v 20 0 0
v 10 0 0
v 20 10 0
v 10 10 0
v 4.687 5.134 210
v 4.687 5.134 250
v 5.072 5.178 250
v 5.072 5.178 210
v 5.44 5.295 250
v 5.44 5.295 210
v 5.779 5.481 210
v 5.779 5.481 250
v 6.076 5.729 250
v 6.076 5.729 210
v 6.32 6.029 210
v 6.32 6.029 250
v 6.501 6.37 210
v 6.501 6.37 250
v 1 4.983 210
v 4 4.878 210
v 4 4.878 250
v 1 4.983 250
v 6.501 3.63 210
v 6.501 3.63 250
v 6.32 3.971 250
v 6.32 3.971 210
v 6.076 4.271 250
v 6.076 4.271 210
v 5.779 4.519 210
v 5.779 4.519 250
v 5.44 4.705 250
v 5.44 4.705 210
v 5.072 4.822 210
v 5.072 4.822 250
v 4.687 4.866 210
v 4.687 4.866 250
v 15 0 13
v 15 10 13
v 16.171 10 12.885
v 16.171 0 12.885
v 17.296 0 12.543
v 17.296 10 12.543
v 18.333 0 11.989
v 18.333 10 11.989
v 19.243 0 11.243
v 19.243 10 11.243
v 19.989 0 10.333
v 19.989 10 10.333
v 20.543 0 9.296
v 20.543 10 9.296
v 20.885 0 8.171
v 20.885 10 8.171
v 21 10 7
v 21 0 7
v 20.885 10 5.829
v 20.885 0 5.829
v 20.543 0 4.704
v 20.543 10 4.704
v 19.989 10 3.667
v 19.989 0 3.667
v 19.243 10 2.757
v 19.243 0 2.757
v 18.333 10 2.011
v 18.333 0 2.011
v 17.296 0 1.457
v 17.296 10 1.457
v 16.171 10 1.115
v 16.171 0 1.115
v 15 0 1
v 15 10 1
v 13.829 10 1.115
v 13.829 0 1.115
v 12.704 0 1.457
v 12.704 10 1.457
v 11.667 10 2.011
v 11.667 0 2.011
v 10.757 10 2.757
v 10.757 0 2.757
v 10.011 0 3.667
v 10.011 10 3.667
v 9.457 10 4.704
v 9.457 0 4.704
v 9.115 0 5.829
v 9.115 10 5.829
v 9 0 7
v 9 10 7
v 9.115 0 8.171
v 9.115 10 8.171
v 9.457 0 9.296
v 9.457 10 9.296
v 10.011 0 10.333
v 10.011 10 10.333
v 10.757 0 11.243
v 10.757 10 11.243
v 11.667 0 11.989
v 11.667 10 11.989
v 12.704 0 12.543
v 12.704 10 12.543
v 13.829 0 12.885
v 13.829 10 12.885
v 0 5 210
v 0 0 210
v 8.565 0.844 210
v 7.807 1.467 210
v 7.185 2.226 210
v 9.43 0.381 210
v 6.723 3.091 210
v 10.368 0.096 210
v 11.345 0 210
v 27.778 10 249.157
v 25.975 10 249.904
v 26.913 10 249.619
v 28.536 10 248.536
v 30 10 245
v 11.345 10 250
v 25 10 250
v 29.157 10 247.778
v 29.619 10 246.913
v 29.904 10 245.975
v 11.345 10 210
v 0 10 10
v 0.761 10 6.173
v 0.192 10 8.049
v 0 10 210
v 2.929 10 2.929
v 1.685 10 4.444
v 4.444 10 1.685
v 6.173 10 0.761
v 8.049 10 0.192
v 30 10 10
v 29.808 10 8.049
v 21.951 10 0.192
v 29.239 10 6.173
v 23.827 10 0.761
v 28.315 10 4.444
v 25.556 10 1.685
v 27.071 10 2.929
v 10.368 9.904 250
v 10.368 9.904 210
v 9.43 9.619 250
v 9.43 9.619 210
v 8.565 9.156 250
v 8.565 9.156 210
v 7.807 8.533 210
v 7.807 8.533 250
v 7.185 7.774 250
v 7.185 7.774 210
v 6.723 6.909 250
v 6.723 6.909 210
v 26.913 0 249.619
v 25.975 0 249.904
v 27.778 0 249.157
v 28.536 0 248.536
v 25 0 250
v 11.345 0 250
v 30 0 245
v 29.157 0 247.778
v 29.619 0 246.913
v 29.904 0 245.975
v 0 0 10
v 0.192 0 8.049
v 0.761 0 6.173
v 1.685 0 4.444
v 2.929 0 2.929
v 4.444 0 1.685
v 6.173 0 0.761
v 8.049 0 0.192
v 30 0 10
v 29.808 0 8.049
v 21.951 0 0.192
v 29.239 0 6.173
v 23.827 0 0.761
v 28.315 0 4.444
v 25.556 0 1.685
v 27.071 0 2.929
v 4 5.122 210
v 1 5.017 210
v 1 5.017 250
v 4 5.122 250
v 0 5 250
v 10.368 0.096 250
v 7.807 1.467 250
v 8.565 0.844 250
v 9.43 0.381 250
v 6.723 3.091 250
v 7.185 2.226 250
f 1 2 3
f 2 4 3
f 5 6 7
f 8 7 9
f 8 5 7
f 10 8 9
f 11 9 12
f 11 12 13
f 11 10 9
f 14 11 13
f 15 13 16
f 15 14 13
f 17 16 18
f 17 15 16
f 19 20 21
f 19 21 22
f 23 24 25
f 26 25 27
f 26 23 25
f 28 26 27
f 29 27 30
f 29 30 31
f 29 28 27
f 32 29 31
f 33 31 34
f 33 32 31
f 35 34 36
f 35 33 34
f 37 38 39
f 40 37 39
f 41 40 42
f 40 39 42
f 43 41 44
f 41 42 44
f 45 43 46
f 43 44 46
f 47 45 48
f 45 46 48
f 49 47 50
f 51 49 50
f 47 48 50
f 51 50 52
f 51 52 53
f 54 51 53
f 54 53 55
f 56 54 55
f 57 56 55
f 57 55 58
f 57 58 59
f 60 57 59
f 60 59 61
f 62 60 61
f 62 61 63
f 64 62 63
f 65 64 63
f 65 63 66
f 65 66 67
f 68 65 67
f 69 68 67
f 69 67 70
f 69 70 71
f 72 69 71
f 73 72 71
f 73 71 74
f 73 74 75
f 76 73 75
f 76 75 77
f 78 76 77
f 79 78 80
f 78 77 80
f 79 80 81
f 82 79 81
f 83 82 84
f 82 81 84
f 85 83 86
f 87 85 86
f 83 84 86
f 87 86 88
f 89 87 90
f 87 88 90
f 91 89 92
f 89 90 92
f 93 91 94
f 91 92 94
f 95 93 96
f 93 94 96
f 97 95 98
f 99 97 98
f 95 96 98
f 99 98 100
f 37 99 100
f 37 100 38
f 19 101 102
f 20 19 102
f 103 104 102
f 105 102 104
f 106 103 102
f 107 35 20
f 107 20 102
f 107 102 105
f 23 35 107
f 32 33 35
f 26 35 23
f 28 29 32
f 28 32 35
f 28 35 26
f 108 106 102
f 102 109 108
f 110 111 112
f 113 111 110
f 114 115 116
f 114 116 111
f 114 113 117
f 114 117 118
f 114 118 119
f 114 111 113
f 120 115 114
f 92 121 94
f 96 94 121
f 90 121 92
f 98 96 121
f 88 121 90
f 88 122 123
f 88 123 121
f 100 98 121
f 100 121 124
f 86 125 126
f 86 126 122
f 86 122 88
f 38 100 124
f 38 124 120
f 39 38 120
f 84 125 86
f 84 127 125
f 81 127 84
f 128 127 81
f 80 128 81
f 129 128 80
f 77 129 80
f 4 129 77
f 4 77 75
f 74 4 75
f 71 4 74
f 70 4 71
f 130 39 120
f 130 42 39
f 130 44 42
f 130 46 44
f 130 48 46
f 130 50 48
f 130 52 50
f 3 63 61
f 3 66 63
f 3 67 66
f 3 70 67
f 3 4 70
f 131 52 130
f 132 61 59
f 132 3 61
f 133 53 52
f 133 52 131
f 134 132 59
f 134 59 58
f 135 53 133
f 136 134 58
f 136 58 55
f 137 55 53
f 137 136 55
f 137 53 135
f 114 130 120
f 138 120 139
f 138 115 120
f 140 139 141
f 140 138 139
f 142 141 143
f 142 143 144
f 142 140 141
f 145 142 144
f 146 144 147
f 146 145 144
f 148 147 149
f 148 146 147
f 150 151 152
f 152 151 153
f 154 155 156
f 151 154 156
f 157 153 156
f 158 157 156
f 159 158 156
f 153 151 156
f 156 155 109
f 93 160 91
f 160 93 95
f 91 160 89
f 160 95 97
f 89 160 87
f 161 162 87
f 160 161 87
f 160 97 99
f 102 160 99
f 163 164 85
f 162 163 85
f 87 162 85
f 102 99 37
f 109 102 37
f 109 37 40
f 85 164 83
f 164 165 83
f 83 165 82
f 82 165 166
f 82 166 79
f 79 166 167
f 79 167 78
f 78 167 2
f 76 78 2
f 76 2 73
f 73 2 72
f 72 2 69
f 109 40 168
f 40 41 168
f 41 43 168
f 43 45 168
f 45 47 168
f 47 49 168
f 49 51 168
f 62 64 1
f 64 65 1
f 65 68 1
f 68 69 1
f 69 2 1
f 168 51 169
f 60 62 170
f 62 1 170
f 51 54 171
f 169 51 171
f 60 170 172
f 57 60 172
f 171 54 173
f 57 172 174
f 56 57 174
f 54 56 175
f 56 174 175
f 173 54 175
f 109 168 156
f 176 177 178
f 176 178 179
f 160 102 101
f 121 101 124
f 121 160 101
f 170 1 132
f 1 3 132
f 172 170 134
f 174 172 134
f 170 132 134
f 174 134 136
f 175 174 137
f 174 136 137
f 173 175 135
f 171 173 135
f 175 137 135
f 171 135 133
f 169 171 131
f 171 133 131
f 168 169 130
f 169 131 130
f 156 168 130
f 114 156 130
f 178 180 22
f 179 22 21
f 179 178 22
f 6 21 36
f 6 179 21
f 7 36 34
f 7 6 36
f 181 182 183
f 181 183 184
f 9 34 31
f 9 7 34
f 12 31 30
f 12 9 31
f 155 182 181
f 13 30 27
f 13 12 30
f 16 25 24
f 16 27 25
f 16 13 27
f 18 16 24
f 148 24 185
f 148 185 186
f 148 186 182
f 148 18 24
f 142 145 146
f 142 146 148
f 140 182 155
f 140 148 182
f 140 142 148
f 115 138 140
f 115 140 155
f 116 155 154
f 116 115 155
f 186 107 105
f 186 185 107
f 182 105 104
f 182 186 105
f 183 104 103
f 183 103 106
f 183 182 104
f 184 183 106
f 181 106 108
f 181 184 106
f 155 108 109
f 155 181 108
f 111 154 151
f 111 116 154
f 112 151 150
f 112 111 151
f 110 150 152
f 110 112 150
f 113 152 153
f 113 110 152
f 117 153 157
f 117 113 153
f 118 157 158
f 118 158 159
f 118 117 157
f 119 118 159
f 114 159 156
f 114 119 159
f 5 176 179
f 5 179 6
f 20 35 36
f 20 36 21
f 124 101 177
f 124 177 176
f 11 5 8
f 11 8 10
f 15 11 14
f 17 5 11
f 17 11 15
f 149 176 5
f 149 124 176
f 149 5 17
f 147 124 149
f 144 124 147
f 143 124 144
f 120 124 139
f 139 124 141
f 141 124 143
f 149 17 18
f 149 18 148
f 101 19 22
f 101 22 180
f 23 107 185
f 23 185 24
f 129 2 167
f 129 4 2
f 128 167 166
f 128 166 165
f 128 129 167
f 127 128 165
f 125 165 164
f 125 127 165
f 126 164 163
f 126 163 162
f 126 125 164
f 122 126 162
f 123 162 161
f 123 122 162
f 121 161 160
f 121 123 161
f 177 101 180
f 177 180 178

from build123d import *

# Parameters (mm, degrees)
SKETCH2_W           = 30
SKETCH2_H           = 10
BOSS_EXTRUDE1_DEPTH = 250
SKETCH3_R           = 6
CUT_EXTRUDE1_DEPTH  = 30
FILLET1_R           = 10
FILLET3_R           = 10
CUT_EXTRUDE2_DEPTH  = 40
FILLET4_R           = 5
FILLET5_R           = 5
FILLET6_R           = 5


with BuildPart() as part:
    # Sketch2 → Boss-Extrude1 (new body)
    with BuildSketch(Plane.XY):
        with Locations((15, 5)):
            Rectangle(SKETCH2_W, SKETCH2_H)
    extrude(amount=BOSS_EXTRUDE1_DEPTH)

    # Sketch3 → Cut-Extrude1 (cut)
    with BuildSketch(Plane(origin=(0, 10, 0), x_dir=(1, 0, 0), z_dir=(0, 1, 0))):
        with Locations((15, -7)):
            Circle(SKETCH3_R)
    extrude(amount=-CUT_EXTRUDE1_DEPTH, mode=Mode.SUBTRACT)

    # Fillet1
    fillet1_edges = [part.edges().sort_by_distance(p)[0] for p in [
        (30, 5, 0),
    ]]
    fillet(fillet1_edges, radius=FILLET1_R)

    # Fillet3
    fillet3_edges = [part.edges().sort_by_distance(p)[0] for p in [
        (0, 5, 0),
    ]]
    fillet(fillet3_edges, radius=FILLET3_R)

    # Sketch5 → Cut-Extrude2 (cut)
    with BuildSketch(Plane.XY.offset(250)):
        with BuildLine():
            Line((0, 10), (0, 5))
            Line((0, 5), (1, 5.017455065))
            Line((1, 5.017455065), (4, 5.122217373))
            Line((4, 5.122217373), (4.687433408, 5.134216568))
            ThreePointArc((4.687433408, 5.134216568), (5.779010382, 5.481326474), (6.501094127, 6.370494985))
            Line((6.501094127, 6.370494985), (8, 10))
            Line((8, 10), (0, 10))
        make_face()
        with BuildLine():
            Line((1, 4.982544935), (0, 5))
            Line((0, 5), (0, 0))
            Line((0, 0), (8, 0))
            Line((8, 0), (6.501094127, 3.629505015))
            ThreePointArc((6.501094127, 3.629505015), (5.779010382, 4.518673526), (4.687433408, 4.865783432))
            Line((4.687433408, 4.865783432), (4, 4.877782627))
            Line((4, 4.877782627), (1, 4.982544935))
        make_face()
    extrude(amount=-CUT_EXTRUDE2_DEPTH, mode=Mode.SUBTRACT)

    # Fillet4
    fillet4_edges = [part.edges().sort_by_distance(p)[0] for p in [
        (8, 10, 230),
    ]]
    fillet(fillet4_edges, radius=FILLET4_R)

    # Fillet5
    fillet5_edges = [part.edges().sort_by_distance(p)[0] for p in [
        (8, 0, 230),
    ]]
    fillet(fillet5_edges, radius=FILLET5_R)

    # Fillet6
    fillet6_edges = [part.edges().sort_by_distance(p)[0] for p in [
        (30, 5, 250),
    ]]
    fillet(fillet6_edges, radius=FILLET6_R)


solid = part.part
